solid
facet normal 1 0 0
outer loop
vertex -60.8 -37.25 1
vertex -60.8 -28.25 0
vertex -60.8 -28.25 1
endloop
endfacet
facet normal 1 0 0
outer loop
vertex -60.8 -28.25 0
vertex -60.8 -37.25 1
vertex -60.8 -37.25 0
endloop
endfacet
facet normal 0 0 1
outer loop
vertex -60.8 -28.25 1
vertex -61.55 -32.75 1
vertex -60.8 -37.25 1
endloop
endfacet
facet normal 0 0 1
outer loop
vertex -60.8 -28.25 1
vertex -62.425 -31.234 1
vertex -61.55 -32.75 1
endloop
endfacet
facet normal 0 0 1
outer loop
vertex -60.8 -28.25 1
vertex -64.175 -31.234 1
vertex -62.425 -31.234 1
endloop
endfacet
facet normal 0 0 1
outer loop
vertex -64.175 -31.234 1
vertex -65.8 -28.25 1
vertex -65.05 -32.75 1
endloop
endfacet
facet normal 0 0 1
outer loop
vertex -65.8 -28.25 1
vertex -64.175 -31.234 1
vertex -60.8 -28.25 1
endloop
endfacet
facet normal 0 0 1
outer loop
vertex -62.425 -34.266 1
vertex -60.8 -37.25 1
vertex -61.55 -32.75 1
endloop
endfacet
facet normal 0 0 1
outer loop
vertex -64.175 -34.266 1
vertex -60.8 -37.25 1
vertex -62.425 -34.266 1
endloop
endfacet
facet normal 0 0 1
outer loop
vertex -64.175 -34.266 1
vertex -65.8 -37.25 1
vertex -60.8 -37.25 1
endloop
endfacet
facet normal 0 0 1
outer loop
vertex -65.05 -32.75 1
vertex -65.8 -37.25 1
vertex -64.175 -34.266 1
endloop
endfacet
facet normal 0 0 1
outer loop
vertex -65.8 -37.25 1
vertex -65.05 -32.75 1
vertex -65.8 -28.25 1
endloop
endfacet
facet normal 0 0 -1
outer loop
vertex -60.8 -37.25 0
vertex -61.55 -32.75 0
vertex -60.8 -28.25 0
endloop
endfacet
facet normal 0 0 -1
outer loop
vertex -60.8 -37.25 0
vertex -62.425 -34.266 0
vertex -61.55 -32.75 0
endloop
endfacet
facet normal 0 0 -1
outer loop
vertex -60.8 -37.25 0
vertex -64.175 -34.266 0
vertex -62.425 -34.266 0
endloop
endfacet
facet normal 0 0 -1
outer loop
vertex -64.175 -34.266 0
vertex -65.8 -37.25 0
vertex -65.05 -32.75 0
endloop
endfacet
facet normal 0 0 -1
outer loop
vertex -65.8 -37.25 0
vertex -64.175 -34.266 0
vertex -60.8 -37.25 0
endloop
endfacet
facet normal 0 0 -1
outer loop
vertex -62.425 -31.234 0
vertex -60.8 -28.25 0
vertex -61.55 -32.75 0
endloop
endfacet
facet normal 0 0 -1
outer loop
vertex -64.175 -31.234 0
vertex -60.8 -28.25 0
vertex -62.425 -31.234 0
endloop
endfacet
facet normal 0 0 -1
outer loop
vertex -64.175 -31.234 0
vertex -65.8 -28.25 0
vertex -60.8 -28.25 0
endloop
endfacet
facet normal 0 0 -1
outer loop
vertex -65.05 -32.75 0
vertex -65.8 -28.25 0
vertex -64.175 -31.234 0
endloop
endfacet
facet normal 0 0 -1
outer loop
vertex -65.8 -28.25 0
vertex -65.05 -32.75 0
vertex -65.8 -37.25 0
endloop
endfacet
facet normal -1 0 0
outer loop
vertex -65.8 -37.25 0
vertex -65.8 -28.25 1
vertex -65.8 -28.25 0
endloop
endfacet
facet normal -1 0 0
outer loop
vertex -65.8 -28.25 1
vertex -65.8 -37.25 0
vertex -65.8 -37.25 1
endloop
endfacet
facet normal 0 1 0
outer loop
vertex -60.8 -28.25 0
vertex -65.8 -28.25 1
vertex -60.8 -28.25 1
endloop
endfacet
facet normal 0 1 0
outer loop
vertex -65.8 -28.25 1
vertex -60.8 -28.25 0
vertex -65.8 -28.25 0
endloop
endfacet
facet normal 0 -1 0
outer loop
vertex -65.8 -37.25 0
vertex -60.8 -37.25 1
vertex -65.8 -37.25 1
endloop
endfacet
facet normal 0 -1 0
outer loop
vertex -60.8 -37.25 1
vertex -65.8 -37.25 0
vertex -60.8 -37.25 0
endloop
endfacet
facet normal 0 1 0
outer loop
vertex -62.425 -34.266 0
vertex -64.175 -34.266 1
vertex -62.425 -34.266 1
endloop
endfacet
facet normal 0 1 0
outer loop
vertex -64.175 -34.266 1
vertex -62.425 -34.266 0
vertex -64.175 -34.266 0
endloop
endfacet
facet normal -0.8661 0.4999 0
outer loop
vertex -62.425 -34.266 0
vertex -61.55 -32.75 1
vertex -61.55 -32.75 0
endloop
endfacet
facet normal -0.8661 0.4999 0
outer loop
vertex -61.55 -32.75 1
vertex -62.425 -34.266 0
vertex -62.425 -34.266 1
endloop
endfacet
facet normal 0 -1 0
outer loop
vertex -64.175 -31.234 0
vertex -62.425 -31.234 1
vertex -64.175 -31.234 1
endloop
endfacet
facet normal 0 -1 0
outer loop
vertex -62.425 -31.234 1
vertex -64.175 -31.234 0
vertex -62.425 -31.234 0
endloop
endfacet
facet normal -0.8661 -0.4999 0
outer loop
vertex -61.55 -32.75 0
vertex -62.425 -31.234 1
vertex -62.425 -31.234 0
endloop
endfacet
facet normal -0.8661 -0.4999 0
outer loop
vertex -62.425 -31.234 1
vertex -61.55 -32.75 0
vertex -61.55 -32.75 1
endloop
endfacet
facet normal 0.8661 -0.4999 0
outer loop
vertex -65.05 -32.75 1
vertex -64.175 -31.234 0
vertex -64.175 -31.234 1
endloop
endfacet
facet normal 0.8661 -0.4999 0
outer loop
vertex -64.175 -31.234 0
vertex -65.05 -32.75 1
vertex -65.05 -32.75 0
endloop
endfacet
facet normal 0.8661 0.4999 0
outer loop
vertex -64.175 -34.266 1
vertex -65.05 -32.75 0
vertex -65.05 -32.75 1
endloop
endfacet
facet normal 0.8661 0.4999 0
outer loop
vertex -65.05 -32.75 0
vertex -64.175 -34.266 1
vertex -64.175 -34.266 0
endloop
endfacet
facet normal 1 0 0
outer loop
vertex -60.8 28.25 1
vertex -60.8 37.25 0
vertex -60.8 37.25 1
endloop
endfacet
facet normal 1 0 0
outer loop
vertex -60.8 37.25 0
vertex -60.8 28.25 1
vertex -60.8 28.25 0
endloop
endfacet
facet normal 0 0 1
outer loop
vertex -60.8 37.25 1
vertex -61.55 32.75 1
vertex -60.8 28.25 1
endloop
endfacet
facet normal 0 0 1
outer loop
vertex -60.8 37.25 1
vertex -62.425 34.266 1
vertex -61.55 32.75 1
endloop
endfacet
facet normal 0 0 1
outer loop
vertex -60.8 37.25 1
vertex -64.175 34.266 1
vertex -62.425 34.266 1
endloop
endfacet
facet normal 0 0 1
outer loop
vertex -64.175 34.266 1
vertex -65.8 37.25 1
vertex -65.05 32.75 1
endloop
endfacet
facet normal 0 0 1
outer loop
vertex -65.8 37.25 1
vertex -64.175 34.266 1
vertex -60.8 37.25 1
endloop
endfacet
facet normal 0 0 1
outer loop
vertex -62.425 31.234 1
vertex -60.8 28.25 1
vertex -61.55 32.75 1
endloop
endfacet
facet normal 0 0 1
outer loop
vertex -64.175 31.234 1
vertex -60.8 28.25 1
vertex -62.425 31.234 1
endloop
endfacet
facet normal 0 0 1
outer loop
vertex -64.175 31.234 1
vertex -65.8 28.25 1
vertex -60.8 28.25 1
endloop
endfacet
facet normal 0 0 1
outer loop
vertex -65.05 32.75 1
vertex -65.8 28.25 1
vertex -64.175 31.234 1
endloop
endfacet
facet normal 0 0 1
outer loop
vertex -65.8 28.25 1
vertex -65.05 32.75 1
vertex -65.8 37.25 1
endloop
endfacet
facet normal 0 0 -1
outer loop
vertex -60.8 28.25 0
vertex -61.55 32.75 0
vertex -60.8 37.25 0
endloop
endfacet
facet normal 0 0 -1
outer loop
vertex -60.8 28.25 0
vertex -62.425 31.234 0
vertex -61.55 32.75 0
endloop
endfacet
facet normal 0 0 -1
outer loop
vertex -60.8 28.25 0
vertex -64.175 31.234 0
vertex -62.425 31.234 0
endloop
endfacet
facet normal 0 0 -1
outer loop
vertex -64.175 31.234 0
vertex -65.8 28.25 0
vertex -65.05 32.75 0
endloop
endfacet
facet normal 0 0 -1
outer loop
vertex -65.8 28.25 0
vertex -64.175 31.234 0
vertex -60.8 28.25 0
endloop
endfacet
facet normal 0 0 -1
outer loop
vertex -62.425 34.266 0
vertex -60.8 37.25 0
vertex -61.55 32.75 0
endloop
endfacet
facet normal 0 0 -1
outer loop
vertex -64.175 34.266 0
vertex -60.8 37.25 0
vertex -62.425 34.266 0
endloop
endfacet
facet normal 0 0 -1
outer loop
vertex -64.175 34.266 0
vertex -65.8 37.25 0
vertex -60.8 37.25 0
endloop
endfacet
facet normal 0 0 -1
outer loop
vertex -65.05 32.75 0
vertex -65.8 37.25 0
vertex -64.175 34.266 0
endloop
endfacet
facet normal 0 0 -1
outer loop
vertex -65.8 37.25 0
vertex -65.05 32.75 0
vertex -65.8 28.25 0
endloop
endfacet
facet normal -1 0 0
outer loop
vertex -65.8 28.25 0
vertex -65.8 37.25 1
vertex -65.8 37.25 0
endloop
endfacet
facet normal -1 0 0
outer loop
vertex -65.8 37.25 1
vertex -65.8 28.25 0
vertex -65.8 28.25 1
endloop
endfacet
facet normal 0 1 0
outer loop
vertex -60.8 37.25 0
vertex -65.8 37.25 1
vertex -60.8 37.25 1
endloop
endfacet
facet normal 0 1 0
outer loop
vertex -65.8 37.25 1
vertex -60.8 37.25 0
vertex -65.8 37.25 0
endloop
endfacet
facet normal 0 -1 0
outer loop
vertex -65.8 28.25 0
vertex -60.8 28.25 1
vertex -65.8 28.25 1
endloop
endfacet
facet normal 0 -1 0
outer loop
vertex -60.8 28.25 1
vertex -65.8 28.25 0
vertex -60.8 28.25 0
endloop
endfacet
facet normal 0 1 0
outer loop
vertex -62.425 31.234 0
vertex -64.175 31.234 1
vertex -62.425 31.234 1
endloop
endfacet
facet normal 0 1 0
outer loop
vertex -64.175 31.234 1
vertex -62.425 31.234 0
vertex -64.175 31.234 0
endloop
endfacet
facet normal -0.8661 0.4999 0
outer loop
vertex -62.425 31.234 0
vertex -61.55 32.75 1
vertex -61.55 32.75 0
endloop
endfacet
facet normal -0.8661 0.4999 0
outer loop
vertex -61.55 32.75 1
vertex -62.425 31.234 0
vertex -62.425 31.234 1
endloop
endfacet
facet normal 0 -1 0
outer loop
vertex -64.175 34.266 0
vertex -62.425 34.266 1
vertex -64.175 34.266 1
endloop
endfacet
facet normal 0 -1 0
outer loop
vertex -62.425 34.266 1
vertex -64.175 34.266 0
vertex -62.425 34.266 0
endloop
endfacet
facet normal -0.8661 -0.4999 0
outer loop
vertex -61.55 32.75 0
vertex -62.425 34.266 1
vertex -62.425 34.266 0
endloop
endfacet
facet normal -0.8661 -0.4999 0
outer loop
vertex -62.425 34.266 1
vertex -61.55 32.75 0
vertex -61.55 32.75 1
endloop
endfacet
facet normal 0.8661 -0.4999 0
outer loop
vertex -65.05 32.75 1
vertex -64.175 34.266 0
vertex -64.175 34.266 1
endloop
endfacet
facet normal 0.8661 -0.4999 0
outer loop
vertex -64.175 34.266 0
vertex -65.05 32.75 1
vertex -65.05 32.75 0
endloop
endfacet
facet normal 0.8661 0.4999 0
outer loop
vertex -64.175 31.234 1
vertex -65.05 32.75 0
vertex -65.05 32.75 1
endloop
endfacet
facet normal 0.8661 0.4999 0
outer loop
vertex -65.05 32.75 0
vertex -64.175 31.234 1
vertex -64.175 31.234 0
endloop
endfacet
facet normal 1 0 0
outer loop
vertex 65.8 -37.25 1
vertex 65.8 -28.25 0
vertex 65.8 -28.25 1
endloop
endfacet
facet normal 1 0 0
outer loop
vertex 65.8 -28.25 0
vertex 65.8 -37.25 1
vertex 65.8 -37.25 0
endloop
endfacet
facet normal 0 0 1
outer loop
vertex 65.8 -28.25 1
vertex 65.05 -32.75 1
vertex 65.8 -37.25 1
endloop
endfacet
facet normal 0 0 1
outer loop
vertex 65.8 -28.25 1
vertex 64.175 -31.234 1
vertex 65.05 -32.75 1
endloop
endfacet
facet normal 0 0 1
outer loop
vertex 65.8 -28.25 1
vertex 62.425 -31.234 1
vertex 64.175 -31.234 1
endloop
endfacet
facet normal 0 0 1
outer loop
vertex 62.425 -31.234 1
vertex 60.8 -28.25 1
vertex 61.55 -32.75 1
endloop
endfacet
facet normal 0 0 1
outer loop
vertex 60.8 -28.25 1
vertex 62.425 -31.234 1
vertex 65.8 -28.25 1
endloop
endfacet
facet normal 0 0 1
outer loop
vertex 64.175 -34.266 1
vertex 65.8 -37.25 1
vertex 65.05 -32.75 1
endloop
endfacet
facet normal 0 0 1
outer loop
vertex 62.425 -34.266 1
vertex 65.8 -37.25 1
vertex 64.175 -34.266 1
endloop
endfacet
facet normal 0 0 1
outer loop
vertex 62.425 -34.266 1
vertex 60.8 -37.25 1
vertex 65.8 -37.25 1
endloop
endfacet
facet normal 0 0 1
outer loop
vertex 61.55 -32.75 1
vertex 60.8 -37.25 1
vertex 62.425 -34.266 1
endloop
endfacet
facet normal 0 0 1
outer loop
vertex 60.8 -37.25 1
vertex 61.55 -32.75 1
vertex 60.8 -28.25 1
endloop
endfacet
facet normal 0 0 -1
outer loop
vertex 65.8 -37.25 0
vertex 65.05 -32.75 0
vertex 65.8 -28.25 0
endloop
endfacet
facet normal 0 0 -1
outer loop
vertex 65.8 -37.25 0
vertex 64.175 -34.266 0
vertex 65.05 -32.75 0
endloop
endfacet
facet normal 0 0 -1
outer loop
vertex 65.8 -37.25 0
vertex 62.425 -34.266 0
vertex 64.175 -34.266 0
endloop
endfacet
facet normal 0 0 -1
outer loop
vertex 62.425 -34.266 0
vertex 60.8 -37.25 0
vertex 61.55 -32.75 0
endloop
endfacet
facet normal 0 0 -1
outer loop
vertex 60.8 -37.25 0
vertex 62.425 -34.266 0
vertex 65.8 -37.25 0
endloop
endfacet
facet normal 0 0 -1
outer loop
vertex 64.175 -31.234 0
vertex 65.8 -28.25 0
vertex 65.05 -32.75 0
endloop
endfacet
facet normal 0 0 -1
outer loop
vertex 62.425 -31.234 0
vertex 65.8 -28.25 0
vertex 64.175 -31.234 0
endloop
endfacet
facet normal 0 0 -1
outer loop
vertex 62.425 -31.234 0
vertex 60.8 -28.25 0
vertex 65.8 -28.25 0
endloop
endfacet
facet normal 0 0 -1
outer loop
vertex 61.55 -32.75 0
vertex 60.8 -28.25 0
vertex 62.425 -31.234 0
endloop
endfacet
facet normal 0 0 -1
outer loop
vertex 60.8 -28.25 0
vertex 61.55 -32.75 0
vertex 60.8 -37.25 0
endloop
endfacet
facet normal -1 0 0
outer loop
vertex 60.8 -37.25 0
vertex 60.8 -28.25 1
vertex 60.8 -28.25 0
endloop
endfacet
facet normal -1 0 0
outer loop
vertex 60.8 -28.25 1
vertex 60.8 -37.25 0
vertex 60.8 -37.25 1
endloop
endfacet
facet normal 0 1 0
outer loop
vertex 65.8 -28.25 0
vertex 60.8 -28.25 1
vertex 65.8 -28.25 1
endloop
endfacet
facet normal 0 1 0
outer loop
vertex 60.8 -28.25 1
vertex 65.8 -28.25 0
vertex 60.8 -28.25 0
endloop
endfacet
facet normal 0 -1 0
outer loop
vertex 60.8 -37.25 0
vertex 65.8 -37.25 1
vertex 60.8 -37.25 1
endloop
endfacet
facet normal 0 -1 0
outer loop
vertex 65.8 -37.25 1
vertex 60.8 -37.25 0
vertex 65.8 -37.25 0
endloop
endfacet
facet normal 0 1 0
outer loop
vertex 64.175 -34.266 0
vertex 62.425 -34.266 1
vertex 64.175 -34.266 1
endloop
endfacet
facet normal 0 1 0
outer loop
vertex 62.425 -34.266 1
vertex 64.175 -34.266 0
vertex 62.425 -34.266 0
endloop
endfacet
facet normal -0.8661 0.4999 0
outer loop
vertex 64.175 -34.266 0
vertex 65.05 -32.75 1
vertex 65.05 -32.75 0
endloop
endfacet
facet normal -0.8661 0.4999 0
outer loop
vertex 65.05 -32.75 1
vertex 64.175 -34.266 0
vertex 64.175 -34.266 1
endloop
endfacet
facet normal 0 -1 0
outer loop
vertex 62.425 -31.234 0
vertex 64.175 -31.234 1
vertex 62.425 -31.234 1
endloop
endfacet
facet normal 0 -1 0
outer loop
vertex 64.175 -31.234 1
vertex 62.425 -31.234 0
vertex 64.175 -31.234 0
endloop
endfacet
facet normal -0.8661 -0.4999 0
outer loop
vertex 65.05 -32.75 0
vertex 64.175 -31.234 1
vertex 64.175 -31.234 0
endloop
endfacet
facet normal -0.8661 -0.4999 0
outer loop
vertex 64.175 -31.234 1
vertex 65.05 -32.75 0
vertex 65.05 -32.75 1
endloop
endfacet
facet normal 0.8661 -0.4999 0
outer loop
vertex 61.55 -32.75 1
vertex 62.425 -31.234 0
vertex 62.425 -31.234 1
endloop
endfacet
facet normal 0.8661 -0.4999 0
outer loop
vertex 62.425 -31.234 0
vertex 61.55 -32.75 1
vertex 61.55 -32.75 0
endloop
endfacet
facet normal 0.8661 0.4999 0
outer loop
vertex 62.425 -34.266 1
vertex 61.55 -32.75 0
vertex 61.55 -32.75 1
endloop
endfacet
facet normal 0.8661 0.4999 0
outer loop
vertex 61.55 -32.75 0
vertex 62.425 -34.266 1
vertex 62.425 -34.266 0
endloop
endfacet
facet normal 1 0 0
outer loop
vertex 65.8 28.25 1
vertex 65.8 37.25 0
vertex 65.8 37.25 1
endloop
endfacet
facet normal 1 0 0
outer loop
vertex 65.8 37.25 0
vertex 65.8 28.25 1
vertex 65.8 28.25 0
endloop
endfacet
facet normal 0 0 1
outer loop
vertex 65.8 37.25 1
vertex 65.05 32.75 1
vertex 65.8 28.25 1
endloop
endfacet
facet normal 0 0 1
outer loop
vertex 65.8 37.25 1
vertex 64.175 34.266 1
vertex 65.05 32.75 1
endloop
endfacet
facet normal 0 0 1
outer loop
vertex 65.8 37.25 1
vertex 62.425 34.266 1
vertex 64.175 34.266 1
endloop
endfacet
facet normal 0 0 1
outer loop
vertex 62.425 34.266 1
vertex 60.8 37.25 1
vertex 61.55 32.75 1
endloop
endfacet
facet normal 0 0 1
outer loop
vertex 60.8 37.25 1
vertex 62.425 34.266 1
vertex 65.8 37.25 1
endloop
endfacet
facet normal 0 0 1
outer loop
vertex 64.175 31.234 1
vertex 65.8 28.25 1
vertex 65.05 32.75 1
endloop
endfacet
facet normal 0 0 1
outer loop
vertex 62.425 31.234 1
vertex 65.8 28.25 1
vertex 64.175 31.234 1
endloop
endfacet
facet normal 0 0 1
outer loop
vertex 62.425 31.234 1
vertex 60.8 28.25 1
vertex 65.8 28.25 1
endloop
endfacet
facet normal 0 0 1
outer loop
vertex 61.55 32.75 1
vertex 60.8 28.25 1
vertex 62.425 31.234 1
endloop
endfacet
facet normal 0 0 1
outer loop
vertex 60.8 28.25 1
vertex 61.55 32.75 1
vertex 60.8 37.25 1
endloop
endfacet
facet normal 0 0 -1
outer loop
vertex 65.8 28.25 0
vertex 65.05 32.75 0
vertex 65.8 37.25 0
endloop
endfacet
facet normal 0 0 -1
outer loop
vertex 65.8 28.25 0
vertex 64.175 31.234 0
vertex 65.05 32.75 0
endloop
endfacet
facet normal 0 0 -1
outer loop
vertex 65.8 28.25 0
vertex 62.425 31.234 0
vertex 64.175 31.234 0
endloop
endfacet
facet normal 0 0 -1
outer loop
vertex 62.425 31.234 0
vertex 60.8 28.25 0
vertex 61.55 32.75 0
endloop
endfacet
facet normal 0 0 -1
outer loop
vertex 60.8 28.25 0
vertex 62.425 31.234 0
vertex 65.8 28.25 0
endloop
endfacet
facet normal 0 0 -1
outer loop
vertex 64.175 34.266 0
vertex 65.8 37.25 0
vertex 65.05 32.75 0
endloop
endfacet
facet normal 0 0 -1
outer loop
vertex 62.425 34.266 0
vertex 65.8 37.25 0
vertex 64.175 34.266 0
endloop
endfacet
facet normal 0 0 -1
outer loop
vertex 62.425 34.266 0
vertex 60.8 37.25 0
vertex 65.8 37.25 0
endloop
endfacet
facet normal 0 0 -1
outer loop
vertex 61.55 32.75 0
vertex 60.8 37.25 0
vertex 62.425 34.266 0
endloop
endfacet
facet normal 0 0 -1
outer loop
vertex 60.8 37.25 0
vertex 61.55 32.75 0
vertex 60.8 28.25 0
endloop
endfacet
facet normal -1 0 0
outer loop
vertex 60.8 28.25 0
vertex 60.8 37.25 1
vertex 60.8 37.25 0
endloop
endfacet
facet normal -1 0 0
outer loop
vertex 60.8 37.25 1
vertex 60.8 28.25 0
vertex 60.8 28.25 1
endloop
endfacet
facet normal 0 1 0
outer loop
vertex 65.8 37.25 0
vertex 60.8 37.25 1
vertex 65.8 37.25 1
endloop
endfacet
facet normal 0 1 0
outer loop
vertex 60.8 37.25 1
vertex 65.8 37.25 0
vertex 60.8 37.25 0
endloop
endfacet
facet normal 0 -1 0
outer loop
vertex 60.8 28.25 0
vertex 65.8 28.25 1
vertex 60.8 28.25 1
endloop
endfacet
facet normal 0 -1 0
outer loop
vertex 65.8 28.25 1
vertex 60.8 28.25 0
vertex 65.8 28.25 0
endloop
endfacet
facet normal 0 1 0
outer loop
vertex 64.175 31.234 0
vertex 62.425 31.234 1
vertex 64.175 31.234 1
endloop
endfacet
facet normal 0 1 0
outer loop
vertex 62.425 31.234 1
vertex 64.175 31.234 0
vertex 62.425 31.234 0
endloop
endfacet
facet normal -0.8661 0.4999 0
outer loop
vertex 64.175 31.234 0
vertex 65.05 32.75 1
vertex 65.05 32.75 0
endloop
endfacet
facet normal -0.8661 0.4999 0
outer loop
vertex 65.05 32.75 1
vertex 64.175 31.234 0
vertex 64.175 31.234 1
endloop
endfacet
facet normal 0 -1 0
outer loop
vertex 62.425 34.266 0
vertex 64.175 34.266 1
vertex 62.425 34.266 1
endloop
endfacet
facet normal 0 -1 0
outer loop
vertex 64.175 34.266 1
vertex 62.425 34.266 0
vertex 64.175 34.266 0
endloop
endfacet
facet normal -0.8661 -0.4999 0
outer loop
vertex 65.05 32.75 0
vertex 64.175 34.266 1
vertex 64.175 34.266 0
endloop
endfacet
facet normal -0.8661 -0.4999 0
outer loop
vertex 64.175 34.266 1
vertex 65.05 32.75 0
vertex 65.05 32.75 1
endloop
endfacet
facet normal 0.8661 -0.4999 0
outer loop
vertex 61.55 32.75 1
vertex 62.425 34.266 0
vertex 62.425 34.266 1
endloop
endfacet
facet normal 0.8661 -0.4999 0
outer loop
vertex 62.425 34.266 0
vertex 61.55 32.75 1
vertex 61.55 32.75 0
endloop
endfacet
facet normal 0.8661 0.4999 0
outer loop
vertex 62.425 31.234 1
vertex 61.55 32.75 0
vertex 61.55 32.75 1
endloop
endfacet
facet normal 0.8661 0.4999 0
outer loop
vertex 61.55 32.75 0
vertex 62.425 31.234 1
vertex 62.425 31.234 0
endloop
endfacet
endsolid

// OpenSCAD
lugW=6;
lugH=8;
lugT=1;

lugDrillDia=3;
lugsGapX=123.6;

lugScreenPlatformL=40;
lubEnlarg=5;

/*/ screen
color("grey")
{
  translate([0,0,-1/2])
  {
      cube(size=[170,100,1],center=true);
  }
}
//*/

for(x=[-1:+2:+1])
{
  for(y=[-1:+2:+1])
  {
      translate( [x*(123.6+lugDrillDia)/2,  y*(73.5-lugH)/2,  lugT/2])
      {
        union()
        {
          // lug On Screen
          difference()
          {
            cube(size=[lugW-1,  lugH+1,  lugT],center=true);
            cylinder(d=3+0.5,h=4,center=true);
          }
          // lug Between Screen And Platform
          translate([-(lugW-1)/2, -((lugH+1)/2+lugT), -lugT/2])
          {
            //cube(size=[(lugW-1),lugT,lugScreenPlatformL],center=false);
            polyhedron(points=[
              [0,0,0],[lugW-1,0,0],
              [0,lugT,0],[lugW-1,lugT,0],
              [0-lubEnlarg,0,lugScreenPlatformL],[lugW-1+lubEnlarg,0,lugScreenPlatformL],
              [0-lubEnlarg,lugT,lugScreenPlatformL],[lugW-1+lubEnlarg,lugT,lugScreenPlatformL]
            ],faces=[
              [0,1,3,2],
              [4,5,7,6],
              [0,1,5,4],
              [2,3,7,6],
              [1,3,7,5],
              [0,2,6,4]
            ]);
          }
        }
      }
  }
}

/*/ platform

translate([0,0,lugScreenPlatformL])
{
  cube(size=[170,100,1],center=true);
}

//*/
